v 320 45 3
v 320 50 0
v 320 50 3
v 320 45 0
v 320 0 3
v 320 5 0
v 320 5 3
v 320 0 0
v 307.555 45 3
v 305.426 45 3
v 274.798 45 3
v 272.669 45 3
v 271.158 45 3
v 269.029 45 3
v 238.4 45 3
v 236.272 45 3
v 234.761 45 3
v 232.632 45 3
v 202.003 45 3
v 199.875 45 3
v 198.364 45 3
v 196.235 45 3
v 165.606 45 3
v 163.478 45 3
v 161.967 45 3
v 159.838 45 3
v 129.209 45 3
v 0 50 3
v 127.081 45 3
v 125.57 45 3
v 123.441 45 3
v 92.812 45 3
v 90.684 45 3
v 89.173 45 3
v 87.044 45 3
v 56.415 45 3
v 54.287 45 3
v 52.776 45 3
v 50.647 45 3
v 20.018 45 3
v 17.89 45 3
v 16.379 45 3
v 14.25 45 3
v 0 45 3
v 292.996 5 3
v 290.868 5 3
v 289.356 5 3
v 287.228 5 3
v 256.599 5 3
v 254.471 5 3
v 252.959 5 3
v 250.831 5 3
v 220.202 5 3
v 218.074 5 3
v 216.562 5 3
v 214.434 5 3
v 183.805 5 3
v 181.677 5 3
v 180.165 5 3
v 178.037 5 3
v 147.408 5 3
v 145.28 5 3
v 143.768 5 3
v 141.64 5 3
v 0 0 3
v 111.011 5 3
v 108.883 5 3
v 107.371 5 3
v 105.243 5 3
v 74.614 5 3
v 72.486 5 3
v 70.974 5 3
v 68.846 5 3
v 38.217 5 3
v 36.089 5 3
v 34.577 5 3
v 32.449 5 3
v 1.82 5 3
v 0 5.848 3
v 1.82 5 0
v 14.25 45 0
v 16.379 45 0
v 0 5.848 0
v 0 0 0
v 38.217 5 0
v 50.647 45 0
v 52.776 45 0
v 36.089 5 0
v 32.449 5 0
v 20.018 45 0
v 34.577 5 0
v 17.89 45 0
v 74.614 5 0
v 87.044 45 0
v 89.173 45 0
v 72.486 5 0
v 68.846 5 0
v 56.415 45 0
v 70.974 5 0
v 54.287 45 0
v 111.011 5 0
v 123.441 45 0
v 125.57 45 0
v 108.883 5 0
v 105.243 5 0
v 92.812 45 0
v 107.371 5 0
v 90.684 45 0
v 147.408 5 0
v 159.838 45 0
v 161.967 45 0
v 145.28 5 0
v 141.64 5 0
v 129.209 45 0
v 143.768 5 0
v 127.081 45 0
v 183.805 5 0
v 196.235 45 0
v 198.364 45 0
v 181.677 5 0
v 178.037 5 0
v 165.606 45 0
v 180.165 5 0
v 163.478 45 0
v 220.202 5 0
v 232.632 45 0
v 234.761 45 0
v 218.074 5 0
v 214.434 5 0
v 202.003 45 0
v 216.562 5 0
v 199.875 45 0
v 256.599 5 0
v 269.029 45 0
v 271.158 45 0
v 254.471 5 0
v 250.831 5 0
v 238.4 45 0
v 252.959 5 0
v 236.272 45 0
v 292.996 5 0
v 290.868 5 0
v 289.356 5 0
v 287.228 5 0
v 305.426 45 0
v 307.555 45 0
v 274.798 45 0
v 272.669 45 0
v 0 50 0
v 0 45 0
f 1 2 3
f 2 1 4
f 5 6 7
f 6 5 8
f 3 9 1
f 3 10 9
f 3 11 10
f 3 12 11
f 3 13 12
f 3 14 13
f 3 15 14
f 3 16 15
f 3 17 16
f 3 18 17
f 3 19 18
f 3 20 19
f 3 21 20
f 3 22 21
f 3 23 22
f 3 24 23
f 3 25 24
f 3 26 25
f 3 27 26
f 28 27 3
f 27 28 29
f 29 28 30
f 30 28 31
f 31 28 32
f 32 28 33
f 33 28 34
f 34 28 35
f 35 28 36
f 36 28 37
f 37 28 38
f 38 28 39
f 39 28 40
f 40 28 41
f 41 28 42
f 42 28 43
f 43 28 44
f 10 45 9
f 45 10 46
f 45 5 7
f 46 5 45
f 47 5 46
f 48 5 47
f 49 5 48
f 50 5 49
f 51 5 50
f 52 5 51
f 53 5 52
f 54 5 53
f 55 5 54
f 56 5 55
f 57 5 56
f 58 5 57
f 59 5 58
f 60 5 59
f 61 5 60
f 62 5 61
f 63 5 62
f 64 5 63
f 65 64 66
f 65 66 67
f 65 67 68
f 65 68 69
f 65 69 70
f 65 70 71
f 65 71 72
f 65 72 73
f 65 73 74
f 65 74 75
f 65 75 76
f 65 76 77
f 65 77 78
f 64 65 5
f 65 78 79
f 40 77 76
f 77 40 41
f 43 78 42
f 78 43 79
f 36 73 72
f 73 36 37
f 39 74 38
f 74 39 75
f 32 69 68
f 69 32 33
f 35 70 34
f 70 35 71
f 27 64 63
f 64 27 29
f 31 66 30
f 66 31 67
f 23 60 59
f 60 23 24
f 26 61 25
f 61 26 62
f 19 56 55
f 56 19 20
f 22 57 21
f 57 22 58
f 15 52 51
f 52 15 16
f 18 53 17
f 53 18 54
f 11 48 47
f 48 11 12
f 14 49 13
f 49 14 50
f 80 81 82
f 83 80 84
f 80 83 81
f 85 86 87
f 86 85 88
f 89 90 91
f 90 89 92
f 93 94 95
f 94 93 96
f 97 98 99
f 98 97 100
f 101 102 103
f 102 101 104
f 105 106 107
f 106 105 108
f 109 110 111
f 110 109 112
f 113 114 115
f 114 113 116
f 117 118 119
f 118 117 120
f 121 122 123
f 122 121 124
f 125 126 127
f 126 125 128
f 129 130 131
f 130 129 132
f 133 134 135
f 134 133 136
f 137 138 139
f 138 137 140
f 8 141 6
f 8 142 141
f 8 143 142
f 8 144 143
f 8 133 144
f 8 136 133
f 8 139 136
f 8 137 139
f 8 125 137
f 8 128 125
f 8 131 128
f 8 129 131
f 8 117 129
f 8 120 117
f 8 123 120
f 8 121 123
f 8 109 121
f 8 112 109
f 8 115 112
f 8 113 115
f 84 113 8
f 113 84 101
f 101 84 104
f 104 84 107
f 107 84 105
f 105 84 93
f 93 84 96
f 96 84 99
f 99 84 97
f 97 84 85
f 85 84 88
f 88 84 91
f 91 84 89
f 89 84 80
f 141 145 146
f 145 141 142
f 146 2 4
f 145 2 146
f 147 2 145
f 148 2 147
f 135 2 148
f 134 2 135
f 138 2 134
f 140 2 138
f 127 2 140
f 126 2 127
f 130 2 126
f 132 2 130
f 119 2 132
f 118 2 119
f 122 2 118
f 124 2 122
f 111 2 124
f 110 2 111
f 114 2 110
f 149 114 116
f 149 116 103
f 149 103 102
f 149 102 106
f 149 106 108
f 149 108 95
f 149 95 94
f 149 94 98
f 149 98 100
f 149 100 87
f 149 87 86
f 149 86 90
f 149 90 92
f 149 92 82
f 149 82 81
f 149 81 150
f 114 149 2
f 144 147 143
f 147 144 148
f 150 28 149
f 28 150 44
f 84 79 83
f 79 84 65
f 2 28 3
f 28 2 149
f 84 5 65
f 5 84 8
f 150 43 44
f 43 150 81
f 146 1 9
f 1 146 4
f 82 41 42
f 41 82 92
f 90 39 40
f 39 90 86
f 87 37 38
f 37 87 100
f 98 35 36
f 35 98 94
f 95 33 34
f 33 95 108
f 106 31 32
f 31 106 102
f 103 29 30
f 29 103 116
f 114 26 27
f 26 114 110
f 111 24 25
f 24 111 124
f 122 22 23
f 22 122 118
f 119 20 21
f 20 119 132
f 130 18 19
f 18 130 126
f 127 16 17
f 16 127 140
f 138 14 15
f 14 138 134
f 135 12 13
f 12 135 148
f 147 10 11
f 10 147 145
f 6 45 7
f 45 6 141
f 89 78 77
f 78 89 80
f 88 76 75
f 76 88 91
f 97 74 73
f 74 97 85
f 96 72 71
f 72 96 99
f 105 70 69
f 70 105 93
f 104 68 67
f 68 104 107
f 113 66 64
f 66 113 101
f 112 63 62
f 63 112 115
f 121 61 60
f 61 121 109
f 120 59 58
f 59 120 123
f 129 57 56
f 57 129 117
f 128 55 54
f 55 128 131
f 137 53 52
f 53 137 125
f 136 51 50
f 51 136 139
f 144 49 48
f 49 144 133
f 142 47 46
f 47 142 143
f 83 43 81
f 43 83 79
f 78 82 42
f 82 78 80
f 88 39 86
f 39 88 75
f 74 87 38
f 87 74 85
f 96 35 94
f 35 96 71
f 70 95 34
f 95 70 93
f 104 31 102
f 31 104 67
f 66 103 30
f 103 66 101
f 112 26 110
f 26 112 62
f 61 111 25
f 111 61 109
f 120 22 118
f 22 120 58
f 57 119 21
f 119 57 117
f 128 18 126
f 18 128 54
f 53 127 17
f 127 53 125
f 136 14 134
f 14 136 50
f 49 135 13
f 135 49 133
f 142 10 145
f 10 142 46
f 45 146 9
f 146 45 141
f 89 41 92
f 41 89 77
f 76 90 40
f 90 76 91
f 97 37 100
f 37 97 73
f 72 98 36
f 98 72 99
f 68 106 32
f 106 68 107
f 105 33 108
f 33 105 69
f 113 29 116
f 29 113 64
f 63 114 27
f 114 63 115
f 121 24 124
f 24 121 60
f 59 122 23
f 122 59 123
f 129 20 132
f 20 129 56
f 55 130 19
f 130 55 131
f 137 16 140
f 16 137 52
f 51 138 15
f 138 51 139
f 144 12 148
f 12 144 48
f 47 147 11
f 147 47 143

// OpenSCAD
// parameters for extendable pipe
X = 320;
Y = 50;
THICKNESS = 3;
ROD_HEIGHT = 5;
TRUSS_WIDTH = 2;
TRUSS_ANGLE = 70;

module TrussBeamTwoDimensions(x, y, thickness, rod_height,
                              truss_width, truss_angle) {
    truss_length = y / sin(truss_angle);
    interval = 2 * truss_length * cos(truss_angle);
    num_of_truss = floor(x / (interval / 2) );
    difference() {
        cube([x, y, thickness]);
        translate([0, rod_height, 0])
            cube([x, y-2*rod_height, thickness]);
    }
    // truss
    intersection() {
        cube([x, y, thickness]);
        for (i = [0 : round(num_of_truss/2)-1]) {
            translate([i*interval, 0, 0])
                rotate([0, 0, truss_angle])
                    cube([truss_length, truss_width, thickness]);
        }
    }
    intersection() {
        cube([x, y, thickness]);
        for (i = [1 : floor(num_of_truss/2)]) {
            translate([i*interval, 0, 0])
                rotate([0, 0, 180 - truss_angle])
                    cube([truss_length, truss_width, thickness]);
        }
    }
}

// main
TrussBeamTwoDimensions(X, Y, THICKNESS, ROD_HEIGHT, TRUSS_WIDTH, TRUSS_ANGLE);
